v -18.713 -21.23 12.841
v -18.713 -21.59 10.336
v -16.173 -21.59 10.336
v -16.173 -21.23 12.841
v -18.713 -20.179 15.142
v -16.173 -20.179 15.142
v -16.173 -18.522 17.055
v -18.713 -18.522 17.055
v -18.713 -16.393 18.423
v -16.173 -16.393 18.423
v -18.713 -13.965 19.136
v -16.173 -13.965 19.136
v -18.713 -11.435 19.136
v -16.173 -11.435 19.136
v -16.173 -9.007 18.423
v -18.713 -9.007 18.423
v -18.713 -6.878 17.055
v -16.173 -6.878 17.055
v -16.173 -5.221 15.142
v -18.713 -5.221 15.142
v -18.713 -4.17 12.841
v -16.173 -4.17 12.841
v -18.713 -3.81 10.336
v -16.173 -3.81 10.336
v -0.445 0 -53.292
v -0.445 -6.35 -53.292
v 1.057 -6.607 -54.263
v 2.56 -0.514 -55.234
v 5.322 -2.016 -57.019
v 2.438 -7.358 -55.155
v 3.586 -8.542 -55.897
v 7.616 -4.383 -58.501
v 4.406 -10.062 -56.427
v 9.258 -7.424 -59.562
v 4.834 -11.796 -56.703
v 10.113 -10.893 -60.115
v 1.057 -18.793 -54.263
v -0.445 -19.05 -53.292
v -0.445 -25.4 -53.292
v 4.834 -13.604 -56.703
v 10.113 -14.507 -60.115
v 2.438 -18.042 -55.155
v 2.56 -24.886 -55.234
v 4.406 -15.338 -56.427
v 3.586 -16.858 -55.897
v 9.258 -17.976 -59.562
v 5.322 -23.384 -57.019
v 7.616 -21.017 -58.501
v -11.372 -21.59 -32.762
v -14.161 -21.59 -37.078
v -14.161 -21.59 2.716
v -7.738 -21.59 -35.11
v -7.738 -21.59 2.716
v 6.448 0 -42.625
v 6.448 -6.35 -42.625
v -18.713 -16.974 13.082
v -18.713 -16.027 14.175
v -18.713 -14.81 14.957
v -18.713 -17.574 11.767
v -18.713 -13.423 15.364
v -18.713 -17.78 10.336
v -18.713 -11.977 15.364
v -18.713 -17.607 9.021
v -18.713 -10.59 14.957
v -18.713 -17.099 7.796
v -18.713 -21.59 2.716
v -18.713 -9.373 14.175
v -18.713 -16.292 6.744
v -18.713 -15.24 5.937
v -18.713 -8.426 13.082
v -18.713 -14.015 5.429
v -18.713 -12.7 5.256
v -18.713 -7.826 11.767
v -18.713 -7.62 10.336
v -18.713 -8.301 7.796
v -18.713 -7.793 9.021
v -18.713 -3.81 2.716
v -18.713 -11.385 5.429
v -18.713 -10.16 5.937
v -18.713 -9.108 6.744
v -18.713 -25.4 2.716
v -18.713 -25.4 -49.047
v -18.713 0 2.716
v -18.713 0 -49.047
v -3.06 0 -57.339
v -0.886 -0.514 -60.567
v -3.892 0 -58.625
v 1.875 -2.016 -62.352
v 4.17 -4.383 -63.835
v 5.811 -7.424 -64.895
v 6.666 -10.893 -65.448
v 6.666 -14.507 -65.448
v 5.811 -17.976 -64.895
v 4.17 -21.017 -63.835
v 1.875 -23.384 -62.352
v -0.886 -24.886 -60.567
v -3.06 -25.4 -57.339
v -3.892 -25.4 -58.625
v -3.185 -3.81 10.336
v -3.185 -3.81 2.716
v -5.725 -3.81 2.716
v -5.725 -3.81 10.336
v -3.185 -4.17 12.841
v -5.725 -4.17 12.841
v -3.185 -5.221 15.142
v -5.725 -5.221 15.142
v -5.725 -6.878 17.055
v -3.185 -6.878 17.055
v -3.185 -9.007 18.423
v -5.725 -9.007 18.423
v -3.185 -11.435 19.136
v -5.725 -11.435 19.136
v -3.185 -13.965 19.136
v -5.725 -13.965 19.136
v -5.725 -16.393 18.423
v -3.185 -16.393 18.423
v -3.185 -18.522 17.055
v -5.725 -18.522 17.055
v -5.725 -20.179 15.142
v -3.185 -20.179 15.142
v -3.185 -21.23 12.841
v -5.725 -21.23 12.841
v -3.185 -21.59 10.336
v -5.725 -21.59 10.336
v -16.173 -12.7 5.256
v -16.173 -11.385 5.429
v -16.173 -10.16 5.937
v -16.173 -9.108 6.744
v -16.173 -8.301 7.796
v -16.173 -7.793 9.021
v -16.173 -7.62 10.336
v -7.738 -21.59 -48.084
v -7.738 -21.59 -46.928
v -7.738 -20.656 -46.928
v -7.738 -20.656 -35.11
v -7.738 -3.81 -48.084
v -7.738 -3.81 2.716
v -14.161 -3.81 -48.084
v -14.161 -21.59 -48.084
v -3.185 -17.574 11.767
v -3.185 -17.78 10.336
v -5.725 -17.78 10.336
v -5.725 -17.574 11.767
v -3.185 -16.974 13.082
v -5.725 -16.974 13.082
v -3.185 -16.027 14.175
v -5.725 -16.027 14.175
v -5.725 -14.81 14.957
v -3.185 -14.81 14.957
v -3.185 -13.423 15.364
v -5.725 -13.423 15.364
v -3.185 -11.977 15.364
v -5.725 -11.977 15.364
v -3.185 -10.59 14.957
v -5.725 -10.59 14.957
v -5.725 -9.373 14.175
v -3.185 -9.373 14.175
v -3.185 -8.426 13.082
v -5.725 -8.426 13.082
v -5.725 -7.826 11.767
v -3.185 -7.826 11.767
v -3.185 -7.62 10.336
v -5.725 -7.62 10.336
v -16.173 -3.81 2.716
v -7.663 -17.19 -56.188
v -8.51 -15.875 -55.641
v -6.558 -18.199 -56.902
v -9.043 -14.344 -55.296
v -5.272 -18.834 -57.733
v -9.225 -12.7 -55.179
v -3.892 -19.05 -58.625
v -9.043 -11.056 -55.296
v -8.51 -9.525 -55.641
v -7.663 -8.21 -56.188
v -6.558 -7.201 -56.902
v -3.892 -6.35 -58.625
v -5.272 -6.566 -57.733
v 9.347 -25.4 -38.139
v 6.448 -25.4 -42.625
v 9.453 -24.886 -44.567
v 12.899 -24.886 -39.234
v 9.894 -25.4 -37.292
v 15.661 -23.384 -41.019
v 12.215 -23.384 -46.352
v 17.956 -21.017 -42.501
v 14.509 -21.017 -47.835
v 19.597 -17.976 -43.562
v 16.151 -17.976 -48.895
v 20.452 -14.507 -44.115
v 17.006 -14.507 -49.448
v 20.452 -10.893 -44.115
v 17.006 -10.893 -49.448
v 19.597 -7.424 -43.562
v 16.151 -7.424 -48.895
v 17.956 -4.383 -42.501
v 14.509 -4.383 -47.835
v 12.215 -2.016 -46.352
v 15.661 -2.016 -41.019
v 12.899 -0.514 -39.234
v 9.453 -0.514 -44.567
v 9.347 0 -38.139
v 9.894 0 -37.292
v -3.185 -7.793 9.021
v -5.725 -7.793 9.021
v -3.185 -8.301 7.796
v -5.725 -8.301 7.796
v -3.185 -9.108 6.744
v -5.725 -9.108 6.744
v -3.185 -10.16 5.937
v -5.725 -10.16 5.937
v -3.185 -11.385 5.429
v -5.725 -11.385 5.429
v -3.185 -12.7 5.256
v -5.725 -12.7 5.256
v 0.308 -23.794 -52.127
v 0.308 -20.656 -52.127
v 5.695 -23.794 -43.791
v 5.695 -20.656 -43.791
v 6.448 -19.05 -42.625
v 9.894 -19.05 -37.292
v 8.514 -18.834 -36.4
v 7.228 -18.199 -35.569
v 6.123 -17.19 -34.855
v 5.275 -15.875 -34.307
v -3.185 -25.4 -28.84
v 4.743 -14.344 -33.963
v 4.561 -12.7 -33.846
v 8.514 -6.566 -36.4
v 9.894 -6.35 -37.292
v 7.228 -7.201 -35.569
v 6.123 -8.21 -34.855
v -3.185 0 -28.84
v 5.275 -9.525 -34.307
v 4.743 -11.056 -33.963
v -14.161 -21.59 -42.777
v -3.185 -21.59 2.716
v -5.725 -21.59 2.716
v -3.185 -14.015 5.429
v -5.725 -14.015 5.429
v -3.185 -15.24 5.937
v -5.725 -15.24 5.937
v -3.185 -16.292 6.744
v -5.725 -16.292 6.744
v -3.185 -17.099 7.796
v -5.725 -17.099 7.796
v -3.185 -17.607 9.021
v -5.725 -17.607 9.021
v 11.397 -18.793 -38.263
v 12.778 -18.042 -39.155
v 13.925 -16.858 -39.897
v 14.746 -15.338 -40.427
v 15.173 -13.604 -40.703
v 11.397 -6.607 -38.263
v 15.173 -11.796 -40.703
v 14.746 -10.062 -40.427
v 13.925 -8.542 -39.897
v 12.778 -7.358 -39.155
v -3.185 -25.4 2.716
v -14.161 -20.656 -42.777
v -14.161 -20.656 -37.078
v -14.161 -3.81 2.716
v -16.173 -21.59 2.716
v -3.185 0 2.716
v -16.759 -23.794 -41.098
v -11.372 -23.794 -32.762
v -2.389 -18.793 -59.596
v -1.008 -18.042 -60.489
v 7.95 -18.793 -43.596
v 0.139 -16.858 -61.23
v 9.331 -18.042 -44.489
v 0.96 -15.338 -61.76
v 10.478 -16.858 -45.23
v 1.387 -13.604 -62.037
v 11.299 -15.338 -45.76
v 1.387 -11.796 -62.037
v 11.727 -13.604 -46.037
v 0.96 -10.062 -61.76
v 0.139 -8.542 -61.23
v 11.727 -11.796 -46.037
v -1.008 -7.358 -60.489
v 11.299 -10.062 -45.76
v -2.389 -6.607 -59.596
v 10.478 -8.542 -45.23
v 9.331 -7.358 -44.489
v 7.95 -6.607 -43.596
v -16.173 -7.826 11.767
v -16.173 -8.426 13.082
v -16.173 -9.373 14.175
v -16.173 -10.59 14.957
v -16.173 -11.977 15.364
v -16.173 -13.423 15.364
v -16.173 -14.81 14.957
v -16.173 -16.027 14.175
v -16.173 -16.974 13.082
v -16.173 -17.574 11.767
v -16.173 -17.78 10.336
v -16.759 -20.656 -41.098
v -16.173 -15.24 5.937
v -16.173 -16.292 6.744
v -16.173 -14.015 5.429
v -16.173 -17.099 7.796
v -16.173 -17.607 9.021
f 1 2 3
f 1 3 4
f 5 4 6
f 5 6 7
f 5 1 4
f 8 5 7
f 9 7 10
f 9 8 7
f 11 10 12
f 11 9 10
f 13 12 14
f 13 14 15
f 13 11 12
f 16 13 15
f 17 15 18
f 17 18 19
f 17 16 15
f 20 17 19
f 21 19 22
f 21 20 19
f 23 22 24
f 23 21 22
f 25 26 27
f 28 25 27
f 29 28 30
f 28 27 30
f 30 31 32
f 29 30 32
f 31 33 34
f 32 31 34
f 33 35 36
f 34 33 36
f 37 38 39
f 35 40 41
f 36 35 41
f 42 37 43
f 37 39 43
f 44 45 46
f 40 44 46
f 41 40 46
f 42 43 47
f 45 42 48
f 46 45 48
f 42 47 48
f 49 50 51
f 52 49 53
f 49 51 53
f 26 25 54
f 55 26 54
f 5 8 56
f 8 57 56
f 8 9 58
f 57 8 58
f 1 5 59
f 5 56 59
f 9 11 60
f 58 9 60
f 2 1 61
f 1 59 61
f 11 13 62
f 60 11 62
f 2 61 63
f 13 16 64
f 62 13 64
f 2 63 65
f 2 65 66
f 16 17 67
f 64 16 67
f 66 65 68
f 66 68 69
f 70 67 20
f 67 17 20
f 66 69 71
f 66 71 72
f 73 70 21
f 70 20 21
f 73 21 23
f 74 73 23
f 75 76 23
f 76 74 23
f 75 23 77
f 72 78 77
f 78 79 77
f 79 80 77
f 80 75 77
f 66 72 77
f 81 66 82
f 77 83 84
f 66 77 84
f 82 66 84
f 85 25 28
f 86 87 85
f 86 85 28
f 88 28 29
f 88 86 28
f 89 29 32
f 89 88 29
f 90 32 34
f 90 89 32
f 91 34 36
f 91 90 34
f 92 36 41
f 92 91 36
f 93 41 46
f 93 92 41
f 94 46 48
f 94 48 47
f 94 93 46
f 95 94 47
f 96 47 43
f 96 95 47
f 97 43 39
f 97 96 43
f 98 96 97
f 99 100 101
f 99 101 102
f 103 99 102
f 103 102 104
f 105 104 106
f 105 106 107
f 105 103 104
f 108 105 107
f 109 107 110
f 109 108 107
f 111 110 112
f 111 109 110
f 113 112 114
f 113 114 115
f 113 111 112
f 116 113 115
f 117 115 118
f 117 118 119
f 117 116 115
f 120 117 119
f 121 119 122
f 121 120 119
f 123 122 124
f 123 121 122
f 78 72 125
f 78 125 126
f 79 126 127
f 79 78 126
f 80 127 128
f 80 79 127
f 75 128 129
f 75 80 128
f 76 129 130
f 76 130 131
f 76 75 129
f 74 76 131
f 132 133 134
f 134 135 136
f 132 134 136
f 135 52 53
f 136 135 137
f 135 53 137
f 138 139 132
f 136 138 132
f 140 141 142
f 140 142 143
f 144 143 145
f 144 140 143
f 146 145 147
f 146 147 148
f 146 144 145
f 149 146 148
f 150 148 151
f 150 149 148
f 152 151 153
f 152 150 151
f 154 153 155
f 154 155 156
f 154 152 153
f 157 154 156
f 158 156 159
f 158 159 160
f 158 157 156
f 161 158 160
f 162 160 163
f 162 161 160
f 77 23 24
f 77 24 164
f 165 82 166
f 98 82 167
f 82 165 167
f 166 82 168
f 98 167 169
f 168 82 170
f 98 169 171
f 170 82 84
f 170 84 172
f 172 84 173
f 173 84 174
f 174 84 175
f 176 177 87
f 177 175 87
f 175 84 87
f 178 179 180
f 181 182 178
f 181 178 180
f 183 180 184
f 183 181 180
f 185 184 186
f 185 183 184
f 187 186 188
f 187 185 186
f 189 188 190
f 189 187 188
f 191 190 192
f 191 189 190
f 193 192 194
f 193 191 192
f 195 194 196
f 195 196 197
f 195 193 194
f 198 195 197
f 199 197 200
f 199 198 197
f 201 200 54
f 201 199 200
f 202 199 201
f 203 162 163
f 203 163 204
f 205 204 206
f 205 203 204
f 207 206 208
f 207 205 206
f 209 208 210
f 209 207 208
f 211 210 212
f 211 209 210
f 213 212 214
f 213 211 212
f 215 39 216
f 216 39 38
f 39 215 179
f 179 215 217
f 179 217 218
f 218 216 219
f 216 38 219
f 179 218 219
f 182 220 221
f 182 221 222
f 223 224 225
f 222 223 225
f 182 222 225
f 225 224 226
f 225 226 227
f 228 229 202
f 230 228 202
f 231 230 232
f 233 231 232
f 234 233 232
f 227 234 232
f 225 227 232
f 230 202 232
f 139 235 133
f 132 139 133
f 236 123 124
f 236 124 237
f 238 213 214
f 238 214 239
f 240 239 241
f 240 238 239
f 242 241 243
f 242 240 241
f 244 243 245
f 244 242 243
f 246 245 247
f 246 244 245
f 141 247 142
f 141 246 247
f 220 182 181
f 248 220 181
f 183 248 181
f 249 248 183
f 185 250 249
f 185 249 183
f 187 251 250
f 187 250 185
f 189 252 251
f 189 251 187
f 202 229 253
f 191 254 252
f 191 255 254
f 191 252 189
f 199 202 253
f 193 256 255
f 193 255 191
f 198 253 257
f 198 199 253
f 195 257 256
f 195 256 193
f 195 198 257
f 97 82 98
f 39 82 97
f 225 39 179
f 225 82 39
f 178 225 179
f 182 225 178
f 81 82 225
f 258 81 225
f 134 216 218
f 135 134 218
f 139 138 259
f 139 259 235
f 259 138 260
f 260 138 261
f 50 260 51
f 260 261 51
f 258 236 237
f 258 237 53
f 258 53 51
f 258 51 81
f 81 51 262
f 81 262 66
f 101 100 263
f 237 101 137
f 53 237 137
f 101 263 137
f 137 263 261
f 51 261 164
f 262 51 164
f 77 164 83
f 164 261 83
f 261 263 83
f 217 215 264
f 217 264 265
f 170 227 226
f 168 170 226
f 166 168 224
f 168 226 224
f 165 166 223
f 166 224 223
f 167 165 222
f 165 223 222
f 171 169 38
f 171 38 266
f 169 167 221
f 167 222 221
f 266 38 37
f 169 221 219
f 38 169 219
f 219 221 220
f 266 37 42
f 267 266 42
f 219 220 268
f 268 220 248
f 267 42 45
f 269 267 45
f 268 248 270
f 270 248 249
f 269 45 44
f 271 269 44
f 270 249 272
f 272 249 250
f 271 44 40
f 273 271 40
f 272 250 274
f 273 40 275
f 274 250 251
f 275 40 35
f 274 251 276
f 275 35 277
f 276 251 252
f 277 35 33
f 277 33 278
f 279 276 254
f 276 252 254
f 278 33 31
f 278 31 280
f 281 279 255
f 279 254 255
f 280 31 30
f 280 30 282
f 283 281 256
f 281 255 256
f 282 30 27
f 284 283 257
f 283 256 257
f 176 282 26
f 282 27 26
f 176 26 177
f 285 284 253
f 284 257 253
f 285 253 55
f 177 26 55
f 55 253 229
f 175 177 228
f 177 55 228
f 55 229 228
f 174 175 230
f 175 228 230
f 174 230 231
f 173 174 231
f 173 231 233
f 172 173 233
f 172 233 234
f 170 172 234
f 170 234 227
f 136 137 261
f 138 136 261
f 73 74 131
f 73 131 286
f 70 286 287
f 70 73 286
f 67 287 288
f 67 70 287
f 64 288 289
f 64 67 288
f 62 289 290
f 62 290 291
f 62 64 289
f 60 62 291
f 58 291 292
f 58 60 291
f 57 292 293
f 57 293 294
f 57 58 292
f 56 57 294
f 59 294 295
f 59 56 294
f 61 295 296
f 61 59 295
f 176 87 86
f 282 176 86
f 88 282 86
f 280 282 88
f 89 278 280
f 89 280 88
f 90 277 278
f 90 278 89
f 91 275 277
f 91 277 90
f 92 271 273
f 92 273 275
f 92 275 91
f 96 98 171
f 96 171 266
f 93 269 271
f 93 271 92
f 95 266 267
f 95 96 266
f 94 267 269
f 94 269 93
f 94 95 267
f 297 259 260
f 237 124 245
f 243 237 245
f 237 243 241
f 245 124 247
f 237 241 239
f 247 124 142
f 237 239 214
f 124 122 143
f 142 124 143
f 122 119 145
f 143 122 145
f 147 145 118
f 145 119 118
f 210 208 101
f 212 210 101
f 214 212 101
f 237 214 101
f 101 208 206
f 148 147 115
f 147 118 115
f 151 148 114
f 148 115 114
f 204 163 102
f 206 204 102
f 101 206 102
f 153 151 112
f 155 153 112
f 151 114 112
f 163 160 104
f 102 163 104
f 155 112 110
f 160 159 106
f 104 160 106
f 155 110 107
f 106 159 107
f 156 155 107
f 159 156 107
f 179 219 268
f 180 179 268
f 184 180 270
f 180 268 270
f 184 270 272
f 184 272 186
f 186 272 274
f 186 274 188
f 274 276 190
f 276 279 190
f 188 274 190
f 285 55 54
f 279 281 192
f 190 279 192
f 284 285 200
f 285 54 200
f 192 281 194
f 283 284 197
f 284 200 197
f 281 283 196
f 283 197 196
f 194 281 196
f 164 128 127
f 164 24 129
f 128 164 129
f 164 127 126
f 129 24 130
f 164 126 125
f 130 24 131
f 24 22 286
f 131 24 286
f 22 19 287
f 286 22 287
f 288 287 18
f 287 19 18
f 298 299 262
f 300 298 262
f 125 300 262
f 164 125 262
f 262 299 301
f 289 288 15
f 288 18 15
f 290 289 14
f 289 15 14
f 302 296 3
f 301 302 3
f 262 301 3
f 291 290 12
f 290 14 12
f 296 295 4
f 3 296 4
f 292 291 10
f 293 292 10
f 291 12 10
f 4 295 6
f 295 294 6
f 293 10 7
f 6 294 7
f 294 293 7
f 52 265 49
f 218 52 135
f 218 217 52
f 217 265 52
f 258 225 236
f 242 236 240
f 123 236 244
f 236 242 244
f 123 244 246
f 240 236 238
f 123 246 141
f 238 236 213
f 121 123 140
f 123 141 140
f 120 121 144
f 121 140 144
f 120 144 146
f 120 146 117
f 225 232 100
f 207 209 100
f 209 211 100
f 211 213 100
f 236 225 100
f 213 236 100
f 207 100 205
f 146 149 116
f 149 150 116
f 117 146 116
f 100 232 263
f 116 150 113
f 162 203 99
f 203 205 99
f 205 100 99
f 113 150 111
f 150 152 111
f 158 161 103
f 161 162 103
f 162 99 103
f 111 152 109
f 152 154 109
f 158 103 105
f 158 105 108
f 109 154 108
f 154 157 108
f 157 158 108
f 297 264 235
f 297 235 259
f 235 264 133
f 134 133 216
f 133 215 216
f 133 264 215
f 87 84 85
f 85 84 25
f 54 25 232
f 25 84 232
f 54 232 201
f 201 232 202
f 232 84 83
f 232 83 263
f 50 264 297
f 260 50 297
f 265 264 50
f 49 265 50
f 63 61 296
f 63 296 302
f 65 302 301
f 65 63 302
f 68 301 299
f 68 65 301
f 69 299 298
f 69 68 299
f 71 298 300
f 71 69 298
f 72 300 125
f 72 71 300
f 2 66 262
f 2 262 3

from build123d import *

# Parameters (mm, degrees)
F1_DEPTH  = 25.4
F3_DEPTH  = 2.54
F5_DEPTH  = 2.54
F8_DEPTH  = 6.35
F9_DEPTH  = 6.35
F10_D     = 12.7
F10_DEPTH = 50.8
F10_TIP   = 3.8154649308
F13_DEPTH = 50.8
F11_W     = 3.138929677
F11_H     = 9.9252452589
F14_DEPTH = 20.32


with BuildPart() as f1:
    # F0 (on Front) → F1 (new body)
    with BuildSketch(Plane.XZ):
        Polygon((9.3470606522, -38.1387286557), (9.8942405438, -37.2919790531), (-3.1854136077, -28.8397474625), (-3.1854136077, 2.7160348484), (-18.7130940077, 2.7160348484), (-18.7130940077, -49.0474707287), (-3.8916078894, -58.6252953208), (-3.0602029376, -57.3387132966), align=None)
    extrude(amount=F1_DEPTH)

    # F2 (on face) → F3 (join)
    with BuildSketch(Plane.YZ.offset(-3.1854136077)):
        with BuildLine():
            Line((-21.59, 2.7160348484), (-12.7, 2.7160348484))
            Line((-12.7, 2.7160348484), (-12.7, 5.2560348484))
            ThreePointArc((-12.7, 5.2560348484), (-16.2921024484, 6.7439323999), (-17.78, 10.3360348484))
            Line((-17.78, 10.3360348484), (-21.59, 10.3360348484))
            Line((-21.59, 10.3360348484), (-21.59, 2.7160348484))
        make_face()
        with BuildLine():
            Line((-12.7, 5.2560348484), (-12.7, 2.7160348484))
            Line((-12.7, 2.7160348484), (-3.81, 2.7160348484))
            Line((-3.81, 2.7160348484), (-3.81, 10.3360348484))
            Line((-3.81, 10.3360348484), (-7.62, 10.3360348484))
            ThreePointArc((-7.62, 10.3360348484), (-9.1078975516, 6.7439323999), (-12.7, 5.2560348484))
        make_face()
        with BuildLine():
            Line((-21.59, 10.3360348484), (-17.78, 10.3360348484))
            ThreePointArc((-17.78, 10.3360348484), (-12.7, 15.4160348484), (-7.62, 10.3360348484))
            Line((-7.62, 10.3360348484), (-3.81, 10.3360348484))
            ThreePointArc((-3.81, 10.3360348484), (-12.7, 19.2260348484), (-21.59, 10.3360348484))
        make_face()
    extrude(amount=-F3_DEPTH)

    # F4 (on face) → F5 (join)
    with BuildSketch(Plane(origin=(-18.7130940077, 0, 0), x_dir=(0, -1, 0), z_dir=(-1, 0, 0))):
        with BuildLine():
            Line((3.81, 2.7160348484), (12.7, 2.7160348484))
            Line((12.7, 2.7160348484), (12.7, 5.2560348484))
            ThreePointArc((12.7, 5.2560348484), (9.1078975516, 6.7439323999), (7.62, 10.3360348484))
            Line((7.62, 10.3360348484), (3.81, 10.3360348484))
            Line((3.81, 10.3360348484), (3.81, 2.7160348484))
        make_face()
        with BuildLine():
            Line((12.7, 5.2560348484), (12.7, 2.7160348484))
            Line((12.7, 2.7160348484), (21.59, 2.7160348484))
            Line((21.59, 2.7160348484), (21.59, 10.3360348484))
            Line((21.59, 10.3360348484), (17.78, 10.3360348484))
            ThreePointArc((17.78, 10.3360348484), (16.2921024484, 6.7439323999), (12.7, 5.2560348484))
        make_face()
        with BuildLine():
            ThreePointArc((7.62, 10.3360348484), (12.7, 15.4160348484), (17.78, 10.3360348484))
            Line((17.78, 10.3360348484), (21.59, 10.3360348484))
            ThreePointArc((21.59, 10.3360348484), (12.7, 19.2260348484), (3.81, 10.3360348484))
            Line((3.81, 10.3360348484), (7.62, 10.3360348484))
        make_face()
    extrude(amount=-F5_DEPTH)

    # F7 (on face) → F8 (join)
    with BuildSketch(Plane(origin=(-14.0850250818, 0, -21.7962859642), x_dir=(0.8398943412, 0, -0.5427499383), z_dir=(0.5427499383, 0, 0.8398943412))):
        with BuildLine():
            Line((28.5503359742, -17.78), (28.5503359742, -25.4))
            ThreePointArc((28.5503359742, -25.4), (41.2503359742, -12.7), (28.5503359742, 0))
            Line((28.5503359742, 0), (28.5503359742, -7.62))
            ThreePointArc((28.5503359742, -7.62), (32.1424384227, -9.1078975516), (33.6303359742, -12.7))
            ThreePointArc((33.6303359742, -12.7), (32.1424384227, -16.2921024484), (28.5503359742, -17.78))
        make_face()
    extrude(amount=-F8_DEPTH)

    # F6 (on face) → F9 (join)
    with BuildSketch(Plane(origin=(-27.8708735149, 0, -43.129602232), x_dir=(0.8398943412, 0, -0.5427499383), z_dir=(-0.5427499383, 0, -0.8398943412))):
        with BuildLine():
            Line((28.5503359742, 7.62), (28.5503359742, 0))
            ThreePointArc((28.5503359742, 0), (41.2503359742, 12.7), (28.5503359742, 25.4))
            Line((28.5503359742, 25.4), (28.5503359742, 17.78))
            ThreePointArc((28.5503359742, 17.78), (32.1424384227, 16.2921024484), (33.6303359742, 12.7))
            ThreePointArc((33.6303359742, 12.7), (32.1424384227, 9.1078975516), (28.5503359742, 7.62))
        make_face()
    extrude(amount=-F9_DEPTH)

    # F10
    with Locations(Plane(origin=(-27.8708735149, 0, -43.129602232), x_dir=(0.8398943412, 0, -0.5427499383), z_dir=(-0.5427499383, 0, -0.8398943412))):
        with Locations((28.5503359742, 12.7)):
            Hole(F10_D / 2, depth=F10_DEPTH)
            with Locations((0, 0, -(F10_DEPTH + F10_TIP / 2))):  # 118° drill point
                Cone(0, F10_D / 2, F10_TIP, mode=Mode.SUBTRACT)

    # F12 (on face) → F13 (cut)
    with BuildSketch(Plane.XY.offset(2.7160348484)):
        Polygon((-7.7378149144, -17.953234597), (-10.9492538077, -12.7), (-14.1606927009, -17.953234597), (-14.1606927009, -21.59), (-7.7378149144, -21.59), align=None)
        Polygon((-10.9492538077, -12.7), (-14.1606927009, -7.446765403), (-14.1606927009, -17.953234597), align=None)
        Polygon((-7.7378149144, -7.446765403), (-10.9492538077, -12.7), (-7.7378149144, -17.953234597), align=None)
        Polygon((-14.1606927009, -3.81), (-14.1606927009, -7.446765403), (-10.9492538077, -12.7), (-7.7378149144, -7.446765403), (-7.7378149144, -3.81), align=None)
    extrude(amount=-F13_DEPTH, mode=Mode.SUBTRACT)

    # F11 (on face) → F14 (cut)
    with BuildSketch(Plane(origin=(23.9792656255, 0, -15.4956930888), x_dir=(0, 1, 0), z_dir=(0.8398943412, 0, -0.5427499383))):
        with Locations((-22.225, -38.6512237359)):
            Rectangle(F11_W, F11_H)
    extrude(amount=-F14_DEPTH, mode=Mode.SUBTRACT)


solid = f1.part
